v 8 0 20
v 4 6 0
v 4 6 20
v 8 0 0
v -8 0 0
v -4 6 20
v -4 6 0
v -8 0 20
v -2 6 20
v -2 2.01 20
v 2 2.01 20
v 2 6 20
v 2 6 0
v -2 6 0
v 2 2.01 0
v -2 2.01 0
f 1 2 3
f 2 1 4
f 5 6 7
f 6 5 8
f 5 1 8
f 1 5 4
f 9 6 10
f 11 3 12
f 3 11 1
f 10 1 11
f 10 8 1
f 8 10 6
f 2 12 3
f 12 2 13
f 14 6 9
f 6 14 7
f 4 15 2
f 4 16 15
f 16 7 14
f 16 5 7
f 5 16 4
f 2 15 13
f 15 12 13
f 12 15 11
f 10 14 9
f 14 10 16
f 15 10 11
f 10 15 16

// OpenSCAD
INF = 1000;
EPS = 0.01;
BOTTOM_WIDTH = 16;
TOP_WIDTH = 8;
THICKNESS = 2;
DEPTH = 20;

HOLE_WIDTH = 4;
HOLE_HEIGHT = 4;
HEIGHT = HOLE_HEIGHT + THICKNESS;

difference() {
  linear_extrude(DEPTH) polygon([
    [-BOTTOM_WIDTH/2, 0],
    [BOTTOM_WIDTH/2, 0],
    [TOP_WIDTH/2, HEIGHT],
    [-TOP_WIDTH/2, HEIGHT],
  ]);

  translate([-HOLE_WIDTH/2, HEIGHT-HOLE_HEIGHT+EPS, -INF/2])
    cube([HOLE_WIDTH, HOLE_HEIGHT, INF]);
}
